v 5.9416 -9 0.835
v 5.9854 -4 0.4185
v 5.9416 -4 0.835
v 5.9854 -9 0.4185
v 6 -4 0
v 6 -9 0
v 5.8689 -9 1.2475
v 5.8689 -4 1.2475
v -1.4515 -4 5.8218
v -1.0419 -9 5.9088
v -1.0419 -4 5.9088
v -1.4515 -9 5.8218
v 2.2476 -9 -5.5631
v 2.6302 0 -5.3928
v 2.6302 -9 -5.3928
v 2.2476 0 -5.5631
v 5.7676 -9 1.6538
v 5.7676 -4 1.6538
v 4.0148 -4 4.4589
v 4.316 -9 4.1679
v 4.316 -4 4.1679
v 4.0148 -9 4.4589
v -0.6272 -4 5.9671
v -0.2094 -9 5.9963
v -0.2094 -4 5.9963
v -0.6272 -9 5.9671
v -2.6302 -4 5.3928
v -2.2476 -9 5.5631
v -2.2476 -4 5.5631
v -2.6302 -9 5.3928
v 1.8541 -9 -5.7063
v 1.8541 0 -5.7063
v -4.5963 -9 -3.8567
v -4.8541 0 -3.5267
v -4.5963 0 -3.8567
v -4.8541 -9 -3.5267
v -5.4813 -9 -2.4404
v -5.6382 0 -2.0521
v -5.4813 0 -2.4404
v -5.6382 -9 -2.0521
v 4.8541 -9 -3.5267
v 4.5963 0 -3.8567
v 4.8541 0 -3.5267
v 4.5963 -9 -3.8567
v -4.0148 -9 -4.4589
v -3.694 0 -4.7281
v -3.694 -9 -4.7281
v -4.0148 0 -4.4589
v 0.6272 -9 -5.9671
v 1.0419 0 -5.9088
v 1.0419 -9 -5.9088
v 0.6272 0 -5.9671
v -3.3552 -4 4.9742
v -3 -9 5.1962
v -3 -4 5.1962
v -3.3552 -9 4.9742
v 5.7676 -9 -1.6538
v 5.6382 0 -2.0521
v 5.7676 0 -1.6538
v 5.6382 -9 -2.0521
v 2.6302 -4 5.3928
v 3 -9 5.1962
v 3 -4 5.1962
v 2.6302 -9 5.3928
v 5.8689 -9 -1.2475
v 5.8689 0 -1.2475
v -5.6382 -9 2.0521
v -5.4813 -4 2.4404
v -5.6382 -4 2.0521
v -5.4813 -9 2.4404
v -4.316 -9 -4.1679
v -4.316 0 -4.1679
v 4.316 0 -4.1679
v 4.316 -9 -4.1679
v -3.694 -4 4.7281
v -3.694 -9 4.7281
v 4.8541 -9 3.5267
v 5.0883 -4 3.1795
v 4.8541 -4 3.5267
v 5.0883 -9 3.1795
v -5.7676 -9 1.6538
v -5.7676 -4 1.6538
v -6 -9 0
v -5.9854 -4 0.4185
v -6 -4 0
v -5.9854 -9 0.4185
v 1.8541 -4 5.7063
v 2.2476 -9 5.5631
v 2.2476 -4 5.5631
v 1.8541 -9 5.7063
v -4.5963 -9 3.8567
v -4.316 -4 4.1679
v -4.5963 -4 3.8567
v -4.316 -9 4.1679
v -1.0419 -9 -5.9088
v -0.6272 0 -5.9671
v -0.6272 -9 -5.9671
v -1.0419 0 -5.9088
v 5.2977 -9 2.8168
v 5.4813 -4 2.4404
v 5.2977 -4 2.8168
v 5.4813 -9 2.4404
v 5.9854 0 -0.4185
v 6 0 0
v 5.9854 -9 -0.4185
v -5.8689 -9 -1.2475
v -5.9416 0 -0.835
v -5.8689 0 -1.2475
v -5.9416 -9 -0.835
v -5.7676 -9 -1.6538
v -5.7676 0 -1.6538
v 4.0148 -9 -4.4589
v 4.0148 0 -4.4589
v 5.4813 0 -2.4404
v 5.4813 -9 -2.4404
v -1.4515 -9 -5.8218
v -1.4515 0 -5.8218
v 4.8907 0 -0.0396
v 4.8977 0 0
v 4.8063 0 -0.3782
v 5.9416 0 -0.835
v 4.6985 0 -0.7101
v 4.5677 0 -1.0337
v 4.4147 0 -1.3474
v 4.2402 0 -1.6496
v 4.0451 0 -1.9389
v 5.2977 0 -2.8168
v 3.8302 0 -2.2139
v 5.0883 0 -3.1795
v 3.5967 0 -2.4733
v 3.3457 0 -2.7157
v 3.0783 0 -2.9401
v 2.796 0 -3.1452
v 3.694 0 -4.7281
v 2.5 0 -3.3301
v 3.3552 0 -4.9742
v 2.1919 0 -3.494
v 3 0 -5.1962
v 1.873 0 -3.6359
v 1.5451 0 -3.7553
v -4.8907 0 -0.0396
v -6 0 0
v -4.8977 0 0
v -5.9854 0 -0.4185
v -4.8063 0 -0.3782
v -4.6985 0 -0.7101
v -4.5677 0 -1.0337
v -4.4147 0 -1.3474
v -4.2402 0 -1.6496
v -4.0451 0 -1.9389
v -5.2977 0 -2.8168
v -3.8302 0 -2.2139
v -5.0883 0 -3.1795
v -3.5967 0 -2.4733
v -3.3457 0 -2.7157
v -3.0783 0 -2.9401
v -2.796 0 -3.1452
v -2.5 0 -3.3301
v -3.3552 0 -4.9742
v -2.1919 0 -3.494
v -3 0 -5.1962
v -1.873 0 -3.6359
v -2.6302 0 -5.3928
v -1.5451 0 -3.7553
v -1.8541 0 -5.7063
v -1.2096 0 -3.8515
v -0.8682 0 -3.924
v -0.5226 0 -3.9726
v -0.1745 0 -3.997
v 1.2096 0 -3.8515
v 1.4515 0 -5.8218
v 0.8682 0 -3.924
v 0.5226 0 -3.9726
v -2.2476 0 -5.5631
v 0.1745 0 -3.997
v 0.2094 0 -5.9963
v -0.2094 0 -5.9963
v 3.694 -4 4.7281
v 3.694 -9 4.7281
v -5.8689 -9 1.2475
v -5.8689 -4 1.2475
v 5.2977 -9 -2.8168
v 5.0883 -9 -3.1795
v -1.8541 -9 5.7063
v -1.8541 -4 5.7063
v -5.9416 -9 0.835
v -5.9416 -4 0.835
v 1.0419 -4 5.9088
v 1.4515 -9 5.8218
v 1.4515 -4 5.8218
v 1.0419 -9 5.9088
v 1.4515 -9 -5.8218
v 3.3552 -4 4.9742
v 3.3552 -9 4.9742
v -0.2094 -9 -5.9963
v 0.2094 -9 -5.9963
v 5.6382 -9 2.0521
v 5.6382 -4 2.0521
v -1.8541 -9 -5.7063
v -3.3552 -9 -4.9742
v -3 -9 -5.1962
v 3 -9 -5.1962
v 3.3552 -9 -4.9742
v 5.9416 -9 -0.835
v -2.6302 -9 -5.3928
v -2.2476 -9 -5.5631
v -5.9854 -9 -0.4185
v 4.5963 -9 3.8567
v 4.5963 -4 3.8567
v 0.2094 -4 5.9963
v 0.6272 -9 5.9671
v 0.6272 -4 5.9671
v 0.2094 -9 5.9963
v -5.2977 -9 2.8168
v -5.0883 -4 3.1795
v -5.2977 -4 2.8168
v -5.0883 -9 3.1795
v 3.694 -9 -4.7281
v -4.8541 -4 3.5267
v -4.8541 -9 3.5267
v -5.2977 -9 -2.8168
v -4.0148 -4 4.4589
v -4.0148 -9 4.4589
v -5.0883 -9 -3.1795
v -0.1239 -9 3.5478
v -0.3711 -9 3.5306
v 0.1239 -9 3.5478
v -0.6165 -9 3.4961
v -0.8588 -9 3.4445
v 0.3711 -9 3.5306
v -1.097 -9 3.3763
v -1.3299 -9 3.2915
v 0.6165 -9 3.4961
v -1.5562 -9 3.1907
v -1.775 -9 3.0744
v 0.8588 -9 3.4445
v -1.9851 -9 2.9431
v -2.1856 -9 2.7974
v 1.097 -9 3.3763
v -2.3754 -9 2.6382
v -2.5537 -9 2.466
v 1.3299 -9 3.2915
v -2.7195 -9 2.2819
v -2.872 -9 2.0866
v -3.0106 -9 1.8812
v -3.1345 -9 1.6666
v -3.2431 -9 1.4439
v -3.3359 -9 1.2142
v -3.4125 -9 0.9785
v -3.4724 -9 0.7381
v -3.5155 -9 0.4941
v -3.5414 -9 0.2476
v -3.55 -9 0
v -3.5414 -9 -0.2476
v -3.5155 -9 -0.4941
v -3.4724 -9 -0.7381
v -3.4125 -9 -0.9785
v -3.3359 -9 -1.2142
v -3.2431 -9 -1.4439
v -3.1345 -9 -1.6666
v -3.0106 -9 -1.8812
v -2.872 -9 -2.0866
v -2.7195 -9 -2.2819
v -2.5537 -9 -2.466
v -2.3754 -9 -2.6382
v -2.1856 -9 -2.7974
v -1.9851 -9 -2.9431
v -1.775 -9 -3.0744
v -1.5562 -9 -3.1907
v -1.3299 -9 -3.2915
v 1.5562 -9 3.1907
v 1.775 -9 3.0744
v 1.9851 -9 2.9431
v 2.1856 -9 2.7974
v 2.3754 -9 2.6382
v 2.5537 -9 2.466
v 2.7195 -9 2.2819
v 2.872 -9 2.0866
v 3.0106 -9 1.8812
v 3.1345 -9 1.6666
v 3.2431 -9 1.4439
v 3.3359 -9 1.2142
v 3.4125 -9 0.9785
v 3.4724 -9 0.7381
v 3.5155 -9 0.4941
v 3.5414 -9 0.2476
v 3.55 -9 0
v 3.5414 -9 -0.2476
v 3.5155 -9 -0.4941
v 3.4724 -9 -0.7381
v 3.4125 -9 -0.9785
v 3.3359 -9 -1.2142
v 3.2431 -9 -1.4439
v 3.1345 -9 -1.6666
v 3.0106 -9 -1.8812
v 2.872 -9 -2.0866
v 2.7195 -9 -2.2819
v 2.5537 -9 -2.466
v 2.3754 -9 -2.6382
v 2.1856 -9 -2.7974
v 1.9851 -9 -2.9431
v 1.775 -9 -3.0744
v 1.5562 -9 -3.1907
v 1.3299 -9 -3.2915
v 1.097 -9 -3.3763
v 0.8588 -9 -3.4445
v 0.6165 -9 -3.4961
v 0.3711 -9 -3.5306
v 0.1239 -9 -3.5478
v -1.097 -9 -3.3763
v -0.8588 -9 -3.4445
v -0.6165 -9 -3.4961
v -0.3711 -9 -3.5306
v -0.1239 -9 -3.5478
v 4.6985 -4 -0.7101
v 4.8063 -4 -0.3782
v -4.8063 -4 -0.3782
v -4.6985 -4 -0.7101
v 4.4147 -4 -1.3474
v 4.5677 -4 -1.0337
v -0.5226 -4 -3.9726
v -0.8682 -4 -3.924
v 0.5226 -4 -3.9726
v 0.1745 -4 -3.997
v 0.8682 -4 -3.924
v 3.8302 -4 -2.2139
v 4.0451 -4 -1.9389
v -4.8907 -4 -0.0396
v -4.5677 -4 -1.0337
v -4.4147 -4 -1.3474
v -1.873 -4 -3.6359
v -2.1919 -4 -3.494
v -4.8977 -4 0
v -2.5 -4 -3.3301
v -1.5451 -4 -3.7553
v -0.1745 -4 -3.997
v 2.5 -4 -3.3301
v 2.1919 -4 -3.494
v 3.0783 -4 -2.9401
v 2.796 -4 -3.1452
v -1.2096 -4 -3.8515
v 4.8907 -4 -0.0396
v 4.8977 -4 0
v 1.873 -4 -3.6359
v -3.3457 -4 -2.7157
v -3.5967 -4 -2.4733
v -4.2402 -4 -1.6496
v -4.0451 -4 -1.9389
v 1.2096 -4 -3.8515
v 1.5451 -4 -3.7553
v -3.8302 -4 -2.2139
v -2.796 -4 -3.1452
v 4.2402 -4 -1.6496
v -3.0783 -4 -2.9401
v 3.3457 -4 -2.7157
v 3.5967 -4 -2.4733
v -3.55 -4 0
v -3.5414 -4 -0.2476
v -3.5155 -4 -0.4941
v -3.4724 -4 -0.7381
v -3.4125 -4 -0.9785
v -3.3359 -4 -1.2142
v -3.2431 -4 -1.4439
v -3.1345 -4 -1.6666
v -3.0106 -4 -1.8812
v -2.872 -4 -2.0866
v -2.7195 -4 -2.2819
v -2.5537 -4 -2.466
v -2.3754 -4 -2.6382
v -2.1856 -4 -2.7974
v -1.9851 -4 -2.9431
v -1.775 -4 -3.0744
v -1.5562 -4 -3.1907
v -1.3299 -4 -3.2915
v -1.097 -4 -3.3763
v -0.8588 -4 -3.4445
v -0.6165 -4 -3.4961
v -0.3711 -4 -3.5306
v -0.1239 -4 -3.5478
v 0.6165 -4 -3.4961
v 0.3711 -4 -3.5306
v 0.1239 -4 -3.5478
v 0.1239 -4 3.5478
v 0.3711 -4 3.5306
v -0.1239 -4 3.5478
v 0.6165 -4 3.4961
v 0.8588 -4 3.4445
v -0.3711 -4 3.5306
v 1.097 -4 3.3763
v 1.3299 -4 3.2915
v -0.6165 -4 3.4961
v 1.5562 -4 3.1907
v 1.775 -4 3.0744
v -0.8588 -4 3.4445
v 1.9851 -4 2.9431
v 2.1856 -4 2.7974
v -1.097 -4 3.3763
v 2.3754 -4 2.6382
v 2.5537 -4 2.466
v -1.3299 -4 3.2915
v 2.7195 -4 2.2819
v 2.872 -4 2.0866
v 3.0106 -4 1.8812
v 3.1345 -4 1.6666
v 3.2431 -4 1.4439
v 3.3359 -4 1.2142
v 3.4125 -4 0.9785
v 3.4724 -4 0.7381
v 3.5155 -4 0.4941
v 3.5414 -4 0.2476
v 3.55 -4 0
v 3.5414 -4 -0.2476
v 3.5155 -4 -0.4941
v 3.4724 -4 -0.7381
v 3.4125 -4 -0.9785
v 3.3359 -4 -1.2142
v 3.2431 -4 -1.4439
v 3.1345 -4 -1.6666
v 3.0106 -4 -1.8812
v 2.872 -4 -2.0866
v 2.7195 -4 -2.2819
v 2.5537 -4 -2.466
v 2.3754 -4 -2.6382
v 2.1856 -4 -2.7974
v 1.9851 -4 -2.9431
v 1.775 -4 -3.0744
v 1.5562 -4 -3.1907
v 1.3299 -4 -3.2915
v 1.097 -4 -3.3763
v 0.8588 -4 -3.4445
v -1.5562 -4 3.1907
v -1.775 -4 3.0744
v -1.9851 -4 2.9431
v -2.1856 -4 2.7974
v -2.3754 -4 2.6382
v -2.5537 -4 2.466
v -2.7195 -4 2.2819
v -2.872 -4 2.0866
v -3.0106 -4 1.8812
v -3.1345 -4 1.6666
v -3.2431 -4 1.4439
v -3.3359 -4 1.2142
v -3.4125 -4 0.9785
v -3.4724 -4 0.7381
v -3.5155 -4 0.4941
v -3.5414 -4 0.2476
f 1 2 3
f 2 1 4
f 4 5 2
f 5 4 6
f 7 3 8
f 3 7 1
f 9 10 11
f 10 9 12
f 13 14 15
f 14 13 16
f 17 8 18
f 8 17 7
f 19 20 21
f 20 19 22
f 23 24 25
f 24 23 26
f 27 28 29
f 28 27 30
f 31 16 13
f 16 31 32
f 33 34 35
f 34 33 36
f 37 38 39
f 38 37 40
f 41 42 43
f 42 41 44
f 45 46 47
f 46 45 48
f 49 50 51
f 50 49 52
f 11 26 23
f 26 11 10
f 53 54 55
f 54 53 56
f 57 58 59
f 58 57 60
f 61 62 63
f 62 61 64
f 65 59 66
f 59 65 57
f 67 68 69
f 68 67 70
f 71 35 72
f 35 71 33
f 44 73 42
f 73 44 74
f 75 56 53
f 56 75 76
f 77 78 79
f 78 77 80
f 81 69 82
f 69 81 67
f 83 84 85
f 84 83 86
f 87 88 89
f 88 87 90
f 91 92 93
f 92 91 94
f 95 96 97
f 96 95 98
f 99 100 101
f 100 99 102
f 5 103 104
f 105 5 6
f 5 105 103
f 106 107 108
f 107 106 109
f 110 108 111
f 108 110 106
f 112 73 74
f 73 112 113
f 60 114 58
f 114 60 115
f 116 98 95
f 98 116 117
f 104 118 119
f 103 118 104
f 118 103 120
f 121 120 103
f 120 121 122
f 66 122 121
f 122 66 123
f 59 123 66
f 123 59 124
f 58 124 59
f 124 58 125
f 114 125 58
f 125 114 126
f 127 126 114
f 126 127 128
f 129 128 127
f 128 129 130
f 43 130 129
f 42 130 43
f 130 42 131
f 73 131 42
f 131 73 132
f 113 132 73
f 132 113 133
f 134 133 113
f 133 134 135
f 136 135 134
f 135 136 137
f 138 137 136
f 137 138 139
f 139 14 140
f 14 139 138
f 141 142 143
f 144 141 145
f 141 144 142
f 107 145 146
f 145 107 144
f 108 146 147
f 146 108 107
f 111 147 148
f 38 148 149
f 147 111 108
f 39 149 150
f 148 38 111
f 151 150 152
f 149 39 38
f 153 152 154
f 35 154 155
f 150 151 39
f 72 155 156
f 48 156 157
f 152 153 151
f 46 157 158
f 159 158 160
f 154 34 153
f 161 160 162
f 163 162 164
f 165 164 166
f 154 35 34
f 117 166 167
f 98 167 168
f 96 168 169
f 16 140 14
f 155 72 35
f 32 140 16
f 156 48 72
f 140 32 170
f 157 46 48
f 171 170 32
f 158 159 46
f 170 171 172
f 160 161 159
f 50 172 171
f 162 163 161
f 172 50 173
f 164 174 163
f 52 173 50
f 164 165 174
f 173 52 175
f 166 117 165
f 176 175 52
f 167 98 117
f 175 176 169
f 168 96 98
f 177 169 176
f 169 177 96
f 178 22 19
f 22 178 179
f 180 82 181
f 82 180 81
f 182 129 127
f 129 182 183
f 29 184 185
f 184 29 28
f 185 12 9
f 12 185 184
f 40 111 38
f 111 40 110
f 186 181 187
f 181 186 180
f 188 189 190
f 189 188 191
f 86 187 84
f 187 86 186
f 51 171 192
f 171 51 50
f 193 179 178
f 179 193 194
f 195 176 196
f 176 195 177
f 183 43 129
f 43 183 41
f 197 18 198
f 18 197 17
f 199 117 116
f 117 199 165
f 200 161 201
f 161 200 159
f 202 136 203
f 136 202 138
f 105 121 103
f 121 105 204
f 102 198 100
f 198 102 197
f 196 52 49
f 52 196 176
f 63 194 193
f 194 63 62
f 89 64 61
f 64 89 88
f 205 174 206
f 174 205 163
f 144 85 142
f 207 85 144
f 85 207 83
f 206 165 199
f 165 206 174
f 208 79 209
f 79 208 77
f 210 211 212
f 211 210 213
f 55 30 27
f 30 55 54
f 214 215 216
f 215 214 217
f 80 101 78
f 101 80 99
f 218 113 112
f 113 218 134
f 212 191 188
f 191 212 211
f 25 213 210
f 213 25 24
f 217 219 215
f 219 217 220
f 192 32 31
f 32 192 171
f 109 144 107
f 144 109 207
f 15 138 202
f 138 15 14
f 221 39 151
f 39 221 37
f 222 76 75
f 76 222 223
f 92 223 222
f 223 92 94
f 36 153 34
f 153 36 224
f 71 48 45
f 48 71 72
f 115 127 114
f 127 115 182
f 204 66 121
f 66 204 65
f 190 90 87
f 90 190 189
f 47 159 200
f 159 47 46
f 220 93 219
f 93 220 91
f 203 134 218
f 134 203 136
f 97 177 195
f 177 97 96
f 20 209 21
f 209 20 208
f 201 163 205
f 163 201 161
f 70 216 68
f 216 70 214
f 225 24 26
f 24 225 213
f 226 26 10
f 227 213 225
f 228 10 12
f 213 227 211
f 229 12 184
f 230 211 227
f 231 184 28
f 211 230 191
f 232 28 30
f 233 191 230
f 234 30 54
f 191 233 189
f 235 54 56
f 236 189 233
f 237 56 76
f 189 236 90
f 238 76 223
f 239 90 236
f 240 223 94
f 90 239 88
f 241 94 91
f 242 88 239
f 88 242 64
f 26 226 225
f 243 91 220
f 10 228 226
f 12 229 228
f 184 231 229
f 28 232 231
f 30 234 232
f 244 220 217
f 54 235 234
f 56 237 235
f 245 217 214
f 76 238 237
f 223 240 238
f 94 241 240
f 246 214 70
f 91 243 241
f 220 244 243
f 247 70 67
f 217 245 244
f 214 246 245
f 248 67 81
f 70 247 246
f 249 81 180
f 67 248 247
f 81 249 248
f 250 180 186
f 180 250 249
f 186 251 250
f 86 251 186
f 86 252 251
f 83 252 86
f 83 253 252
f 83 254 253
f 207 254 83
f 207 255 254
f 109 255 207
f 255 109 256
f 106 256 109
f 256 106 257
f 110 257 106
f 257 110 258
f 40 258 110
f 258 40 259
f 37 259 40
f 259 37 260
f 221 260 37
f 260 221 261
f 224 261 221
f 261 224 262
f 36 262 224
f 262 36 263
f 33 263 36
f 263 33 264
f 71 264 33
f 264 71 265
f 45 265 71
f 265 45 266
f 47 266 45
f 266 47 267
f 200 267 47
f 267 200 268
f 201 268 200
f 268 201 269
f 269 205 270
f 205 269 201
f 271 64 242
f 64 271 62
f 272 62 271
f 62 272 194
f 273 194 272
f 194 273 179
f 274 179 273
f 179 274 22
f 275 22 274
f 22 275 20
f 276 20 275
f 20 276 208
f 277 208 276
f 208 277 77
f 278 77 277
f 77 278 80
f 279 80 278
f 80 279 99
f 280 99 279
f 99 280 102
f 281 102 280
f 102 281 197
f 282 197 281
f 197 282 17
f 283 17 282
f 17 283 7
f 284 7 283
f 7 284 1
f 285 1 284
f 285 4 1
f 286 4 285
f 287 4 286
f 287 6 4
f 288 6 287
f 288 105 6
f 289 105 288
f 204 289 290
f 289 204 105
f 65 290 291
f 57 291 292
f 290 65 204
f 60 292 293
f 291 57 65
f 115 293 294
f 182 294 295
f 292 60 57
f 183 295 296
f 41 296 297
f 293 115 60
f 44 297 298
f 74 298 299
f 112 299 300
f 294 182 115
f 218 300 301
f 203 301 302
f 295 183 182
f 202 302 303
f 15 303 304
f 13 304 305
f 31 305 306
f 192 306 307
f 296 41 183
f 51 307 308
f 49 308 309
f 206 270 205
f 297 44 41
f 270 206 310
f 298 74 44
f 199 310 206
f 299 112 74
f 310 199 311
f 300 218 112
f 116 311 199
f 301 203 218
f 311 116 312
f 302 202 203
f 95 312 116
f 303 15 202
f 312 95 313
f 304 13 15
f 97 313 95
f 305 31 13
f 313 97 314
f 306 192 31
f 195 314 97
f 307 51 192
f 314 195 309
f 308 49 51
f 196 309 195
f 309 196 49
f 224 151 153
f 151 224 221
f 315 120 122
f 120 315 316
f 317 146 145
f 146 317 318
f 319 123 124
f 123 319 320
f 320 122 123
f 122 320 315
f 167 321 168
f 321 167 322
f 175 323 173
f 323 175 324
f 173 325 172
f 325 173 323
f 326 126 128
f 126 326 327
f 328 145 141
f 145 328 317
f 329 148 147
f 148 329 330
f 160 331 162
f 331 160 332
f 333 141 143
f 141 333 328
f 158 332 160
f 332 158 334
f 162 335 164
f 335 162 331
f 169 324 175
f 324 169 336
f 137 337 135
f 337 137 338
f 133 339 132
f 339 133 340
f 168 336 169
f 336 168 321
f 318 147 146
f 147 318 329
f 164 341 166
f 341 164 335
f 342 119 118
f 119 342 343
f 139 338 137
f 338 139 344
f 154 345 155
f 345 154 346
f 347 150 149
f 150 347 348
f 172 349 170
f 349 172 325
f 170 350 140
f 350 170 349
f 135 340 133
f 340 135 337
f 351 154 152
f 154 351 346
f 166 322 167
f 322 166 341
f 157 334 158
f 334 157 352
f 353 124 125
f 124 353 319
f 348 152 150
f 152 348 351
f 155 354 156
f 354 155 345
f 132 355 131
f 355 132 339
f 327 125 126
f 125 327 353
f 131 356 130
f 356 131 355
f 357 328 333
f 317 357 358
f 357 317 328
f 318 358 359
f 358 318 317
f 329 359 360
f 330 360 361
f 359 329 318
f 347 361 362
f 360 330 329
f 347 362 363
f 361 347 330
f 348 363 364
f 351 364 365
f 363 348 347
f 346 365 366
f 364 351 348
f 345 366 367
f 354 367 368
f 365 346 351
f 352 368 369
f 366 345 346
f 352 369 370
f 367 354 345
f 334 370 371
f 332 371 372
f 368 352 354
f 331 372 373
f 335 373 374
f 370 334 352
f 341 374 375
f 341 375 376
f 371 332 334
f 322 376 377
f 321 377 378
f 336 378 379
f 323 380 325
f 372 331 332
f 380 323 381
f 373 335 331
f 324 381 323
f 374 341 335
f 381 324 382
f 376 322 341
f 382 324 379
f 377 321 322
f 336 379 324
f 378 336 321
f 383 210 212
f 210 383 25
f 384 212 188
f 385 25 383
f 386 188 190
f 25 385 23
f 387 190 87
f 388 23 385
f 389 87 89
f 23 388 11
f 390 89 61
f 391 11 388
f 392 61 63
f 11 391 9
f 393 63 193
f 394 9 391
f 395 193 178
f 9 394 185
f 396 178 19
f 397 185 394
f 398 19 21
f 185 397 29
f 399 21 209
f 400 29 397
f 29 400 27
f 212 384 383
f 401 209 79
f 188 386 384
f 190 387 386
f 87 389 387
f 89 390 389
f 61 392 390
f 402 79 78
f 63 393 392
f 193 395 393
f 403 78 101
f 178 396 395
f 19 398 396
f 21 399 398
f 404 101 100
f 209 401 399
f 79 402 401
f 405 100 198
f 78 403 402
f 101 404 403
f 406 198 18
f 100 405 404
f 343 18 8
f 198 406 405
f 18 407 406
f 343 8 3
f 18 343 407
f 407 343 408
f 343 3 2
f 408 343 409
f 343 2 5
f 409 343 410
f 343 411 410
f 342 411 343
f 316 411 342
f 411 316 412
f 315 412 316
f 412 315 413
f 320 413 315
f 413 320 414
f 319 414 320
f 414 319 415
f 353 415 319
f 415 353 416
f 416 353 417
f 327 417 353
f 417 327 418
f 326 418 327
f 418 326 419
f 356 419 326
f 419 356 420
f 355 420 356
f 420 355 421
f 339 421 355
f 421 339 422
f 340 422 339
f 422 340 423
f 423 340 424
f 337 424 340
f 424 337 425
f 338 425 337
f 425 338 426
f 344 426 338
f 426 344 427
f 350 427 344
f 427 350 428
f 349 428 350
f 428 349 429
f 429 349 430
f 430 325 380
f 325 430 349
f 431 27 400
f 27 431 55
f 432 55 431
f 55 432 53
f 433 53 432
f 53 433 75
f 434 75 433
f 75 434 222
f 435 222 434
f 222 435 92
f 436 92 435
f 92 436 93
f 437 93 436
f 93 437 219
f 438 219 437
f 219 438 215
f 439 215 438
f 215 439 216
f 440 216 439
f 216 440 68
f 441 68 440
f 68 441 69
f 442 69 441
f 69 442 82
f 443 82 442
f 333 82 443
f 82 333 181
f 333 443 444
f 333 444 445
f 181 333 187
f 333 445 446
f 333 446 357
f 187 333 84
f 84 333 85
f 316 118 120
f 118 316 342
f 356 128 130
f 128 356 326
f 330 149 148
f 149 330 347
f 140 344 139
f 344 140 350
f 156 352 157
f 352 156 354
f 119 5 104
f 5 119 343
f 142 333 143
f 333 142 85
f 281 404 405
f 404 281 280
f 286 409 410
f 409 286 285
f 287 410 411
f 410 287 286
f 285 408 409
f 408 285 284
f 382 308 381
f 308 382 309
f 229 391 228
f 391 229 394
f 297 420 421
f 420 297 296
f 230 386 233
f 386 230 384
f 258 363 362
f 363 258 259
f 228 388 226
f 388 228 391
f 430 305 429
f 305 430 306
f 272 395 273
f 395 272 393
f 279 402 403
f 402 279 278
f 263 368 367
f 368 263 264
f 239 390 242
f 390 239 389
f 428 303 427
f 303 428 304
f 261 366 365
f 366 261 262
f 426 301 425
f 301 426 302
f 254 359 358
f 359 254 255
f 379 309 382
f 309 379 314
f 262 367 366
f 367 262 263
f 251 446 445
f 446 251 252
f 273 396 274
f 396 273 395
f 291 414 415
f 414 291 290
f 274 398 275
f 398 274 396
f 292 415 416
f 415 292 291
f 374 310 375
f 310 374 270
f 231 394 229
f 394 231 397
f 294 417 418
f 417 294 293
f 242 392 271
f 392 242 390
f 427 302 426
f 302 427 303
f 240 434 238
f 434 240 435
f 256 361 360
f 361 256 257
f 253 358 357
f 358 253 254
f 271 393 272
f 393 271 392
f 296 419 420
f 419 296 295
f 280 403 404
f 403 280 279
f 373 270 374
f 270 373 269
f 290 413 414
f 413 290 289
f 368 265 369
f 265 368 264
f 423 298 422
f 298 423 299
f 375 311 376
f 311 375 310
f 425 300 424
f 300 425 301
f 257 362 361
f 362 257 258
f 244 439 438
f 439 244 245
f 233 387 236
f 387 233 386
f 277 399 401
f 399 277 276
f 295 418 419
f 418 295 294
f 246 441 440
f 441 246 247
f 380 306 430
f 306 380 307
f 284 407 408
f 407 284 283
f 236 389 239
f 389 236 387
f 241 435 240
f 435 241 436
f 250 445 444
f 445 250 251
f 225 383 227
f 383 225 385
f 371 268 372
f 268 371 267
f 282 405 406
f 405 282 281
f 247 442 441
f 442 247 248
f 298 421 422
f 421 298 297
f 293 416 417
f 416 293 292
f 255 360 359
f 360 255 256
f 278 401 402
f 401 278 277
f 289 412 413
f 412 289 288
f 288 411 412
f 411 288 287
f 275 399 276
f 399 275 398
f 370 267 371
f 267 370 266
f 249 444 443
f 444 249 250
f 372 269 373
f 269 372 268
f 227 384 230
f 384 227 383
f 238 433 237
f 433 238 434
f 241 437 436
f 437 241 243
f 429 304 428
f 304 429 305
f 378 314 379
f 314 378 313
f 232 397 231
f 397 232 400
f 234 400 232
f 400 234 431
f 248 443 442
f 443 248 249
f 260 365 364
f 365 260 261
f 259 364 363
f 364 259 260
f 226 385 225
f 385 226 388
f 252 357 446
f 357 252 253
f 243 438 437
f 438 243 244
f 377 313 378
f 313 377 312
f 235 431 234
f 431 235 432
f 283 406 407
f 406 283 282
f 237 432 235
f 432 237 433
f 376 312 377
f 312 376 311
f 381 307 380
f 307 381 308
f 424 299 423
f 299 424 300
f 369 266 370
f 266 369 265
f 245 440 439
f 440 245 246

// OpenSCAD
$fn = 90;

rotate([90, 0, 0]) {
    difference() {
        cylinder(d = 12, h = 9);
        translate([0, 1, -6]) cylinder(d = 10, h = 10);
        translate([0, 5, -1]) cube([20, 10, 10], true);
        translate([0, 0, -10]) cylinder(d = 7.1, h = 30);
        
        //#translate([0, 0, 4]) cylinder(d = 5,h=5);
    }
}
